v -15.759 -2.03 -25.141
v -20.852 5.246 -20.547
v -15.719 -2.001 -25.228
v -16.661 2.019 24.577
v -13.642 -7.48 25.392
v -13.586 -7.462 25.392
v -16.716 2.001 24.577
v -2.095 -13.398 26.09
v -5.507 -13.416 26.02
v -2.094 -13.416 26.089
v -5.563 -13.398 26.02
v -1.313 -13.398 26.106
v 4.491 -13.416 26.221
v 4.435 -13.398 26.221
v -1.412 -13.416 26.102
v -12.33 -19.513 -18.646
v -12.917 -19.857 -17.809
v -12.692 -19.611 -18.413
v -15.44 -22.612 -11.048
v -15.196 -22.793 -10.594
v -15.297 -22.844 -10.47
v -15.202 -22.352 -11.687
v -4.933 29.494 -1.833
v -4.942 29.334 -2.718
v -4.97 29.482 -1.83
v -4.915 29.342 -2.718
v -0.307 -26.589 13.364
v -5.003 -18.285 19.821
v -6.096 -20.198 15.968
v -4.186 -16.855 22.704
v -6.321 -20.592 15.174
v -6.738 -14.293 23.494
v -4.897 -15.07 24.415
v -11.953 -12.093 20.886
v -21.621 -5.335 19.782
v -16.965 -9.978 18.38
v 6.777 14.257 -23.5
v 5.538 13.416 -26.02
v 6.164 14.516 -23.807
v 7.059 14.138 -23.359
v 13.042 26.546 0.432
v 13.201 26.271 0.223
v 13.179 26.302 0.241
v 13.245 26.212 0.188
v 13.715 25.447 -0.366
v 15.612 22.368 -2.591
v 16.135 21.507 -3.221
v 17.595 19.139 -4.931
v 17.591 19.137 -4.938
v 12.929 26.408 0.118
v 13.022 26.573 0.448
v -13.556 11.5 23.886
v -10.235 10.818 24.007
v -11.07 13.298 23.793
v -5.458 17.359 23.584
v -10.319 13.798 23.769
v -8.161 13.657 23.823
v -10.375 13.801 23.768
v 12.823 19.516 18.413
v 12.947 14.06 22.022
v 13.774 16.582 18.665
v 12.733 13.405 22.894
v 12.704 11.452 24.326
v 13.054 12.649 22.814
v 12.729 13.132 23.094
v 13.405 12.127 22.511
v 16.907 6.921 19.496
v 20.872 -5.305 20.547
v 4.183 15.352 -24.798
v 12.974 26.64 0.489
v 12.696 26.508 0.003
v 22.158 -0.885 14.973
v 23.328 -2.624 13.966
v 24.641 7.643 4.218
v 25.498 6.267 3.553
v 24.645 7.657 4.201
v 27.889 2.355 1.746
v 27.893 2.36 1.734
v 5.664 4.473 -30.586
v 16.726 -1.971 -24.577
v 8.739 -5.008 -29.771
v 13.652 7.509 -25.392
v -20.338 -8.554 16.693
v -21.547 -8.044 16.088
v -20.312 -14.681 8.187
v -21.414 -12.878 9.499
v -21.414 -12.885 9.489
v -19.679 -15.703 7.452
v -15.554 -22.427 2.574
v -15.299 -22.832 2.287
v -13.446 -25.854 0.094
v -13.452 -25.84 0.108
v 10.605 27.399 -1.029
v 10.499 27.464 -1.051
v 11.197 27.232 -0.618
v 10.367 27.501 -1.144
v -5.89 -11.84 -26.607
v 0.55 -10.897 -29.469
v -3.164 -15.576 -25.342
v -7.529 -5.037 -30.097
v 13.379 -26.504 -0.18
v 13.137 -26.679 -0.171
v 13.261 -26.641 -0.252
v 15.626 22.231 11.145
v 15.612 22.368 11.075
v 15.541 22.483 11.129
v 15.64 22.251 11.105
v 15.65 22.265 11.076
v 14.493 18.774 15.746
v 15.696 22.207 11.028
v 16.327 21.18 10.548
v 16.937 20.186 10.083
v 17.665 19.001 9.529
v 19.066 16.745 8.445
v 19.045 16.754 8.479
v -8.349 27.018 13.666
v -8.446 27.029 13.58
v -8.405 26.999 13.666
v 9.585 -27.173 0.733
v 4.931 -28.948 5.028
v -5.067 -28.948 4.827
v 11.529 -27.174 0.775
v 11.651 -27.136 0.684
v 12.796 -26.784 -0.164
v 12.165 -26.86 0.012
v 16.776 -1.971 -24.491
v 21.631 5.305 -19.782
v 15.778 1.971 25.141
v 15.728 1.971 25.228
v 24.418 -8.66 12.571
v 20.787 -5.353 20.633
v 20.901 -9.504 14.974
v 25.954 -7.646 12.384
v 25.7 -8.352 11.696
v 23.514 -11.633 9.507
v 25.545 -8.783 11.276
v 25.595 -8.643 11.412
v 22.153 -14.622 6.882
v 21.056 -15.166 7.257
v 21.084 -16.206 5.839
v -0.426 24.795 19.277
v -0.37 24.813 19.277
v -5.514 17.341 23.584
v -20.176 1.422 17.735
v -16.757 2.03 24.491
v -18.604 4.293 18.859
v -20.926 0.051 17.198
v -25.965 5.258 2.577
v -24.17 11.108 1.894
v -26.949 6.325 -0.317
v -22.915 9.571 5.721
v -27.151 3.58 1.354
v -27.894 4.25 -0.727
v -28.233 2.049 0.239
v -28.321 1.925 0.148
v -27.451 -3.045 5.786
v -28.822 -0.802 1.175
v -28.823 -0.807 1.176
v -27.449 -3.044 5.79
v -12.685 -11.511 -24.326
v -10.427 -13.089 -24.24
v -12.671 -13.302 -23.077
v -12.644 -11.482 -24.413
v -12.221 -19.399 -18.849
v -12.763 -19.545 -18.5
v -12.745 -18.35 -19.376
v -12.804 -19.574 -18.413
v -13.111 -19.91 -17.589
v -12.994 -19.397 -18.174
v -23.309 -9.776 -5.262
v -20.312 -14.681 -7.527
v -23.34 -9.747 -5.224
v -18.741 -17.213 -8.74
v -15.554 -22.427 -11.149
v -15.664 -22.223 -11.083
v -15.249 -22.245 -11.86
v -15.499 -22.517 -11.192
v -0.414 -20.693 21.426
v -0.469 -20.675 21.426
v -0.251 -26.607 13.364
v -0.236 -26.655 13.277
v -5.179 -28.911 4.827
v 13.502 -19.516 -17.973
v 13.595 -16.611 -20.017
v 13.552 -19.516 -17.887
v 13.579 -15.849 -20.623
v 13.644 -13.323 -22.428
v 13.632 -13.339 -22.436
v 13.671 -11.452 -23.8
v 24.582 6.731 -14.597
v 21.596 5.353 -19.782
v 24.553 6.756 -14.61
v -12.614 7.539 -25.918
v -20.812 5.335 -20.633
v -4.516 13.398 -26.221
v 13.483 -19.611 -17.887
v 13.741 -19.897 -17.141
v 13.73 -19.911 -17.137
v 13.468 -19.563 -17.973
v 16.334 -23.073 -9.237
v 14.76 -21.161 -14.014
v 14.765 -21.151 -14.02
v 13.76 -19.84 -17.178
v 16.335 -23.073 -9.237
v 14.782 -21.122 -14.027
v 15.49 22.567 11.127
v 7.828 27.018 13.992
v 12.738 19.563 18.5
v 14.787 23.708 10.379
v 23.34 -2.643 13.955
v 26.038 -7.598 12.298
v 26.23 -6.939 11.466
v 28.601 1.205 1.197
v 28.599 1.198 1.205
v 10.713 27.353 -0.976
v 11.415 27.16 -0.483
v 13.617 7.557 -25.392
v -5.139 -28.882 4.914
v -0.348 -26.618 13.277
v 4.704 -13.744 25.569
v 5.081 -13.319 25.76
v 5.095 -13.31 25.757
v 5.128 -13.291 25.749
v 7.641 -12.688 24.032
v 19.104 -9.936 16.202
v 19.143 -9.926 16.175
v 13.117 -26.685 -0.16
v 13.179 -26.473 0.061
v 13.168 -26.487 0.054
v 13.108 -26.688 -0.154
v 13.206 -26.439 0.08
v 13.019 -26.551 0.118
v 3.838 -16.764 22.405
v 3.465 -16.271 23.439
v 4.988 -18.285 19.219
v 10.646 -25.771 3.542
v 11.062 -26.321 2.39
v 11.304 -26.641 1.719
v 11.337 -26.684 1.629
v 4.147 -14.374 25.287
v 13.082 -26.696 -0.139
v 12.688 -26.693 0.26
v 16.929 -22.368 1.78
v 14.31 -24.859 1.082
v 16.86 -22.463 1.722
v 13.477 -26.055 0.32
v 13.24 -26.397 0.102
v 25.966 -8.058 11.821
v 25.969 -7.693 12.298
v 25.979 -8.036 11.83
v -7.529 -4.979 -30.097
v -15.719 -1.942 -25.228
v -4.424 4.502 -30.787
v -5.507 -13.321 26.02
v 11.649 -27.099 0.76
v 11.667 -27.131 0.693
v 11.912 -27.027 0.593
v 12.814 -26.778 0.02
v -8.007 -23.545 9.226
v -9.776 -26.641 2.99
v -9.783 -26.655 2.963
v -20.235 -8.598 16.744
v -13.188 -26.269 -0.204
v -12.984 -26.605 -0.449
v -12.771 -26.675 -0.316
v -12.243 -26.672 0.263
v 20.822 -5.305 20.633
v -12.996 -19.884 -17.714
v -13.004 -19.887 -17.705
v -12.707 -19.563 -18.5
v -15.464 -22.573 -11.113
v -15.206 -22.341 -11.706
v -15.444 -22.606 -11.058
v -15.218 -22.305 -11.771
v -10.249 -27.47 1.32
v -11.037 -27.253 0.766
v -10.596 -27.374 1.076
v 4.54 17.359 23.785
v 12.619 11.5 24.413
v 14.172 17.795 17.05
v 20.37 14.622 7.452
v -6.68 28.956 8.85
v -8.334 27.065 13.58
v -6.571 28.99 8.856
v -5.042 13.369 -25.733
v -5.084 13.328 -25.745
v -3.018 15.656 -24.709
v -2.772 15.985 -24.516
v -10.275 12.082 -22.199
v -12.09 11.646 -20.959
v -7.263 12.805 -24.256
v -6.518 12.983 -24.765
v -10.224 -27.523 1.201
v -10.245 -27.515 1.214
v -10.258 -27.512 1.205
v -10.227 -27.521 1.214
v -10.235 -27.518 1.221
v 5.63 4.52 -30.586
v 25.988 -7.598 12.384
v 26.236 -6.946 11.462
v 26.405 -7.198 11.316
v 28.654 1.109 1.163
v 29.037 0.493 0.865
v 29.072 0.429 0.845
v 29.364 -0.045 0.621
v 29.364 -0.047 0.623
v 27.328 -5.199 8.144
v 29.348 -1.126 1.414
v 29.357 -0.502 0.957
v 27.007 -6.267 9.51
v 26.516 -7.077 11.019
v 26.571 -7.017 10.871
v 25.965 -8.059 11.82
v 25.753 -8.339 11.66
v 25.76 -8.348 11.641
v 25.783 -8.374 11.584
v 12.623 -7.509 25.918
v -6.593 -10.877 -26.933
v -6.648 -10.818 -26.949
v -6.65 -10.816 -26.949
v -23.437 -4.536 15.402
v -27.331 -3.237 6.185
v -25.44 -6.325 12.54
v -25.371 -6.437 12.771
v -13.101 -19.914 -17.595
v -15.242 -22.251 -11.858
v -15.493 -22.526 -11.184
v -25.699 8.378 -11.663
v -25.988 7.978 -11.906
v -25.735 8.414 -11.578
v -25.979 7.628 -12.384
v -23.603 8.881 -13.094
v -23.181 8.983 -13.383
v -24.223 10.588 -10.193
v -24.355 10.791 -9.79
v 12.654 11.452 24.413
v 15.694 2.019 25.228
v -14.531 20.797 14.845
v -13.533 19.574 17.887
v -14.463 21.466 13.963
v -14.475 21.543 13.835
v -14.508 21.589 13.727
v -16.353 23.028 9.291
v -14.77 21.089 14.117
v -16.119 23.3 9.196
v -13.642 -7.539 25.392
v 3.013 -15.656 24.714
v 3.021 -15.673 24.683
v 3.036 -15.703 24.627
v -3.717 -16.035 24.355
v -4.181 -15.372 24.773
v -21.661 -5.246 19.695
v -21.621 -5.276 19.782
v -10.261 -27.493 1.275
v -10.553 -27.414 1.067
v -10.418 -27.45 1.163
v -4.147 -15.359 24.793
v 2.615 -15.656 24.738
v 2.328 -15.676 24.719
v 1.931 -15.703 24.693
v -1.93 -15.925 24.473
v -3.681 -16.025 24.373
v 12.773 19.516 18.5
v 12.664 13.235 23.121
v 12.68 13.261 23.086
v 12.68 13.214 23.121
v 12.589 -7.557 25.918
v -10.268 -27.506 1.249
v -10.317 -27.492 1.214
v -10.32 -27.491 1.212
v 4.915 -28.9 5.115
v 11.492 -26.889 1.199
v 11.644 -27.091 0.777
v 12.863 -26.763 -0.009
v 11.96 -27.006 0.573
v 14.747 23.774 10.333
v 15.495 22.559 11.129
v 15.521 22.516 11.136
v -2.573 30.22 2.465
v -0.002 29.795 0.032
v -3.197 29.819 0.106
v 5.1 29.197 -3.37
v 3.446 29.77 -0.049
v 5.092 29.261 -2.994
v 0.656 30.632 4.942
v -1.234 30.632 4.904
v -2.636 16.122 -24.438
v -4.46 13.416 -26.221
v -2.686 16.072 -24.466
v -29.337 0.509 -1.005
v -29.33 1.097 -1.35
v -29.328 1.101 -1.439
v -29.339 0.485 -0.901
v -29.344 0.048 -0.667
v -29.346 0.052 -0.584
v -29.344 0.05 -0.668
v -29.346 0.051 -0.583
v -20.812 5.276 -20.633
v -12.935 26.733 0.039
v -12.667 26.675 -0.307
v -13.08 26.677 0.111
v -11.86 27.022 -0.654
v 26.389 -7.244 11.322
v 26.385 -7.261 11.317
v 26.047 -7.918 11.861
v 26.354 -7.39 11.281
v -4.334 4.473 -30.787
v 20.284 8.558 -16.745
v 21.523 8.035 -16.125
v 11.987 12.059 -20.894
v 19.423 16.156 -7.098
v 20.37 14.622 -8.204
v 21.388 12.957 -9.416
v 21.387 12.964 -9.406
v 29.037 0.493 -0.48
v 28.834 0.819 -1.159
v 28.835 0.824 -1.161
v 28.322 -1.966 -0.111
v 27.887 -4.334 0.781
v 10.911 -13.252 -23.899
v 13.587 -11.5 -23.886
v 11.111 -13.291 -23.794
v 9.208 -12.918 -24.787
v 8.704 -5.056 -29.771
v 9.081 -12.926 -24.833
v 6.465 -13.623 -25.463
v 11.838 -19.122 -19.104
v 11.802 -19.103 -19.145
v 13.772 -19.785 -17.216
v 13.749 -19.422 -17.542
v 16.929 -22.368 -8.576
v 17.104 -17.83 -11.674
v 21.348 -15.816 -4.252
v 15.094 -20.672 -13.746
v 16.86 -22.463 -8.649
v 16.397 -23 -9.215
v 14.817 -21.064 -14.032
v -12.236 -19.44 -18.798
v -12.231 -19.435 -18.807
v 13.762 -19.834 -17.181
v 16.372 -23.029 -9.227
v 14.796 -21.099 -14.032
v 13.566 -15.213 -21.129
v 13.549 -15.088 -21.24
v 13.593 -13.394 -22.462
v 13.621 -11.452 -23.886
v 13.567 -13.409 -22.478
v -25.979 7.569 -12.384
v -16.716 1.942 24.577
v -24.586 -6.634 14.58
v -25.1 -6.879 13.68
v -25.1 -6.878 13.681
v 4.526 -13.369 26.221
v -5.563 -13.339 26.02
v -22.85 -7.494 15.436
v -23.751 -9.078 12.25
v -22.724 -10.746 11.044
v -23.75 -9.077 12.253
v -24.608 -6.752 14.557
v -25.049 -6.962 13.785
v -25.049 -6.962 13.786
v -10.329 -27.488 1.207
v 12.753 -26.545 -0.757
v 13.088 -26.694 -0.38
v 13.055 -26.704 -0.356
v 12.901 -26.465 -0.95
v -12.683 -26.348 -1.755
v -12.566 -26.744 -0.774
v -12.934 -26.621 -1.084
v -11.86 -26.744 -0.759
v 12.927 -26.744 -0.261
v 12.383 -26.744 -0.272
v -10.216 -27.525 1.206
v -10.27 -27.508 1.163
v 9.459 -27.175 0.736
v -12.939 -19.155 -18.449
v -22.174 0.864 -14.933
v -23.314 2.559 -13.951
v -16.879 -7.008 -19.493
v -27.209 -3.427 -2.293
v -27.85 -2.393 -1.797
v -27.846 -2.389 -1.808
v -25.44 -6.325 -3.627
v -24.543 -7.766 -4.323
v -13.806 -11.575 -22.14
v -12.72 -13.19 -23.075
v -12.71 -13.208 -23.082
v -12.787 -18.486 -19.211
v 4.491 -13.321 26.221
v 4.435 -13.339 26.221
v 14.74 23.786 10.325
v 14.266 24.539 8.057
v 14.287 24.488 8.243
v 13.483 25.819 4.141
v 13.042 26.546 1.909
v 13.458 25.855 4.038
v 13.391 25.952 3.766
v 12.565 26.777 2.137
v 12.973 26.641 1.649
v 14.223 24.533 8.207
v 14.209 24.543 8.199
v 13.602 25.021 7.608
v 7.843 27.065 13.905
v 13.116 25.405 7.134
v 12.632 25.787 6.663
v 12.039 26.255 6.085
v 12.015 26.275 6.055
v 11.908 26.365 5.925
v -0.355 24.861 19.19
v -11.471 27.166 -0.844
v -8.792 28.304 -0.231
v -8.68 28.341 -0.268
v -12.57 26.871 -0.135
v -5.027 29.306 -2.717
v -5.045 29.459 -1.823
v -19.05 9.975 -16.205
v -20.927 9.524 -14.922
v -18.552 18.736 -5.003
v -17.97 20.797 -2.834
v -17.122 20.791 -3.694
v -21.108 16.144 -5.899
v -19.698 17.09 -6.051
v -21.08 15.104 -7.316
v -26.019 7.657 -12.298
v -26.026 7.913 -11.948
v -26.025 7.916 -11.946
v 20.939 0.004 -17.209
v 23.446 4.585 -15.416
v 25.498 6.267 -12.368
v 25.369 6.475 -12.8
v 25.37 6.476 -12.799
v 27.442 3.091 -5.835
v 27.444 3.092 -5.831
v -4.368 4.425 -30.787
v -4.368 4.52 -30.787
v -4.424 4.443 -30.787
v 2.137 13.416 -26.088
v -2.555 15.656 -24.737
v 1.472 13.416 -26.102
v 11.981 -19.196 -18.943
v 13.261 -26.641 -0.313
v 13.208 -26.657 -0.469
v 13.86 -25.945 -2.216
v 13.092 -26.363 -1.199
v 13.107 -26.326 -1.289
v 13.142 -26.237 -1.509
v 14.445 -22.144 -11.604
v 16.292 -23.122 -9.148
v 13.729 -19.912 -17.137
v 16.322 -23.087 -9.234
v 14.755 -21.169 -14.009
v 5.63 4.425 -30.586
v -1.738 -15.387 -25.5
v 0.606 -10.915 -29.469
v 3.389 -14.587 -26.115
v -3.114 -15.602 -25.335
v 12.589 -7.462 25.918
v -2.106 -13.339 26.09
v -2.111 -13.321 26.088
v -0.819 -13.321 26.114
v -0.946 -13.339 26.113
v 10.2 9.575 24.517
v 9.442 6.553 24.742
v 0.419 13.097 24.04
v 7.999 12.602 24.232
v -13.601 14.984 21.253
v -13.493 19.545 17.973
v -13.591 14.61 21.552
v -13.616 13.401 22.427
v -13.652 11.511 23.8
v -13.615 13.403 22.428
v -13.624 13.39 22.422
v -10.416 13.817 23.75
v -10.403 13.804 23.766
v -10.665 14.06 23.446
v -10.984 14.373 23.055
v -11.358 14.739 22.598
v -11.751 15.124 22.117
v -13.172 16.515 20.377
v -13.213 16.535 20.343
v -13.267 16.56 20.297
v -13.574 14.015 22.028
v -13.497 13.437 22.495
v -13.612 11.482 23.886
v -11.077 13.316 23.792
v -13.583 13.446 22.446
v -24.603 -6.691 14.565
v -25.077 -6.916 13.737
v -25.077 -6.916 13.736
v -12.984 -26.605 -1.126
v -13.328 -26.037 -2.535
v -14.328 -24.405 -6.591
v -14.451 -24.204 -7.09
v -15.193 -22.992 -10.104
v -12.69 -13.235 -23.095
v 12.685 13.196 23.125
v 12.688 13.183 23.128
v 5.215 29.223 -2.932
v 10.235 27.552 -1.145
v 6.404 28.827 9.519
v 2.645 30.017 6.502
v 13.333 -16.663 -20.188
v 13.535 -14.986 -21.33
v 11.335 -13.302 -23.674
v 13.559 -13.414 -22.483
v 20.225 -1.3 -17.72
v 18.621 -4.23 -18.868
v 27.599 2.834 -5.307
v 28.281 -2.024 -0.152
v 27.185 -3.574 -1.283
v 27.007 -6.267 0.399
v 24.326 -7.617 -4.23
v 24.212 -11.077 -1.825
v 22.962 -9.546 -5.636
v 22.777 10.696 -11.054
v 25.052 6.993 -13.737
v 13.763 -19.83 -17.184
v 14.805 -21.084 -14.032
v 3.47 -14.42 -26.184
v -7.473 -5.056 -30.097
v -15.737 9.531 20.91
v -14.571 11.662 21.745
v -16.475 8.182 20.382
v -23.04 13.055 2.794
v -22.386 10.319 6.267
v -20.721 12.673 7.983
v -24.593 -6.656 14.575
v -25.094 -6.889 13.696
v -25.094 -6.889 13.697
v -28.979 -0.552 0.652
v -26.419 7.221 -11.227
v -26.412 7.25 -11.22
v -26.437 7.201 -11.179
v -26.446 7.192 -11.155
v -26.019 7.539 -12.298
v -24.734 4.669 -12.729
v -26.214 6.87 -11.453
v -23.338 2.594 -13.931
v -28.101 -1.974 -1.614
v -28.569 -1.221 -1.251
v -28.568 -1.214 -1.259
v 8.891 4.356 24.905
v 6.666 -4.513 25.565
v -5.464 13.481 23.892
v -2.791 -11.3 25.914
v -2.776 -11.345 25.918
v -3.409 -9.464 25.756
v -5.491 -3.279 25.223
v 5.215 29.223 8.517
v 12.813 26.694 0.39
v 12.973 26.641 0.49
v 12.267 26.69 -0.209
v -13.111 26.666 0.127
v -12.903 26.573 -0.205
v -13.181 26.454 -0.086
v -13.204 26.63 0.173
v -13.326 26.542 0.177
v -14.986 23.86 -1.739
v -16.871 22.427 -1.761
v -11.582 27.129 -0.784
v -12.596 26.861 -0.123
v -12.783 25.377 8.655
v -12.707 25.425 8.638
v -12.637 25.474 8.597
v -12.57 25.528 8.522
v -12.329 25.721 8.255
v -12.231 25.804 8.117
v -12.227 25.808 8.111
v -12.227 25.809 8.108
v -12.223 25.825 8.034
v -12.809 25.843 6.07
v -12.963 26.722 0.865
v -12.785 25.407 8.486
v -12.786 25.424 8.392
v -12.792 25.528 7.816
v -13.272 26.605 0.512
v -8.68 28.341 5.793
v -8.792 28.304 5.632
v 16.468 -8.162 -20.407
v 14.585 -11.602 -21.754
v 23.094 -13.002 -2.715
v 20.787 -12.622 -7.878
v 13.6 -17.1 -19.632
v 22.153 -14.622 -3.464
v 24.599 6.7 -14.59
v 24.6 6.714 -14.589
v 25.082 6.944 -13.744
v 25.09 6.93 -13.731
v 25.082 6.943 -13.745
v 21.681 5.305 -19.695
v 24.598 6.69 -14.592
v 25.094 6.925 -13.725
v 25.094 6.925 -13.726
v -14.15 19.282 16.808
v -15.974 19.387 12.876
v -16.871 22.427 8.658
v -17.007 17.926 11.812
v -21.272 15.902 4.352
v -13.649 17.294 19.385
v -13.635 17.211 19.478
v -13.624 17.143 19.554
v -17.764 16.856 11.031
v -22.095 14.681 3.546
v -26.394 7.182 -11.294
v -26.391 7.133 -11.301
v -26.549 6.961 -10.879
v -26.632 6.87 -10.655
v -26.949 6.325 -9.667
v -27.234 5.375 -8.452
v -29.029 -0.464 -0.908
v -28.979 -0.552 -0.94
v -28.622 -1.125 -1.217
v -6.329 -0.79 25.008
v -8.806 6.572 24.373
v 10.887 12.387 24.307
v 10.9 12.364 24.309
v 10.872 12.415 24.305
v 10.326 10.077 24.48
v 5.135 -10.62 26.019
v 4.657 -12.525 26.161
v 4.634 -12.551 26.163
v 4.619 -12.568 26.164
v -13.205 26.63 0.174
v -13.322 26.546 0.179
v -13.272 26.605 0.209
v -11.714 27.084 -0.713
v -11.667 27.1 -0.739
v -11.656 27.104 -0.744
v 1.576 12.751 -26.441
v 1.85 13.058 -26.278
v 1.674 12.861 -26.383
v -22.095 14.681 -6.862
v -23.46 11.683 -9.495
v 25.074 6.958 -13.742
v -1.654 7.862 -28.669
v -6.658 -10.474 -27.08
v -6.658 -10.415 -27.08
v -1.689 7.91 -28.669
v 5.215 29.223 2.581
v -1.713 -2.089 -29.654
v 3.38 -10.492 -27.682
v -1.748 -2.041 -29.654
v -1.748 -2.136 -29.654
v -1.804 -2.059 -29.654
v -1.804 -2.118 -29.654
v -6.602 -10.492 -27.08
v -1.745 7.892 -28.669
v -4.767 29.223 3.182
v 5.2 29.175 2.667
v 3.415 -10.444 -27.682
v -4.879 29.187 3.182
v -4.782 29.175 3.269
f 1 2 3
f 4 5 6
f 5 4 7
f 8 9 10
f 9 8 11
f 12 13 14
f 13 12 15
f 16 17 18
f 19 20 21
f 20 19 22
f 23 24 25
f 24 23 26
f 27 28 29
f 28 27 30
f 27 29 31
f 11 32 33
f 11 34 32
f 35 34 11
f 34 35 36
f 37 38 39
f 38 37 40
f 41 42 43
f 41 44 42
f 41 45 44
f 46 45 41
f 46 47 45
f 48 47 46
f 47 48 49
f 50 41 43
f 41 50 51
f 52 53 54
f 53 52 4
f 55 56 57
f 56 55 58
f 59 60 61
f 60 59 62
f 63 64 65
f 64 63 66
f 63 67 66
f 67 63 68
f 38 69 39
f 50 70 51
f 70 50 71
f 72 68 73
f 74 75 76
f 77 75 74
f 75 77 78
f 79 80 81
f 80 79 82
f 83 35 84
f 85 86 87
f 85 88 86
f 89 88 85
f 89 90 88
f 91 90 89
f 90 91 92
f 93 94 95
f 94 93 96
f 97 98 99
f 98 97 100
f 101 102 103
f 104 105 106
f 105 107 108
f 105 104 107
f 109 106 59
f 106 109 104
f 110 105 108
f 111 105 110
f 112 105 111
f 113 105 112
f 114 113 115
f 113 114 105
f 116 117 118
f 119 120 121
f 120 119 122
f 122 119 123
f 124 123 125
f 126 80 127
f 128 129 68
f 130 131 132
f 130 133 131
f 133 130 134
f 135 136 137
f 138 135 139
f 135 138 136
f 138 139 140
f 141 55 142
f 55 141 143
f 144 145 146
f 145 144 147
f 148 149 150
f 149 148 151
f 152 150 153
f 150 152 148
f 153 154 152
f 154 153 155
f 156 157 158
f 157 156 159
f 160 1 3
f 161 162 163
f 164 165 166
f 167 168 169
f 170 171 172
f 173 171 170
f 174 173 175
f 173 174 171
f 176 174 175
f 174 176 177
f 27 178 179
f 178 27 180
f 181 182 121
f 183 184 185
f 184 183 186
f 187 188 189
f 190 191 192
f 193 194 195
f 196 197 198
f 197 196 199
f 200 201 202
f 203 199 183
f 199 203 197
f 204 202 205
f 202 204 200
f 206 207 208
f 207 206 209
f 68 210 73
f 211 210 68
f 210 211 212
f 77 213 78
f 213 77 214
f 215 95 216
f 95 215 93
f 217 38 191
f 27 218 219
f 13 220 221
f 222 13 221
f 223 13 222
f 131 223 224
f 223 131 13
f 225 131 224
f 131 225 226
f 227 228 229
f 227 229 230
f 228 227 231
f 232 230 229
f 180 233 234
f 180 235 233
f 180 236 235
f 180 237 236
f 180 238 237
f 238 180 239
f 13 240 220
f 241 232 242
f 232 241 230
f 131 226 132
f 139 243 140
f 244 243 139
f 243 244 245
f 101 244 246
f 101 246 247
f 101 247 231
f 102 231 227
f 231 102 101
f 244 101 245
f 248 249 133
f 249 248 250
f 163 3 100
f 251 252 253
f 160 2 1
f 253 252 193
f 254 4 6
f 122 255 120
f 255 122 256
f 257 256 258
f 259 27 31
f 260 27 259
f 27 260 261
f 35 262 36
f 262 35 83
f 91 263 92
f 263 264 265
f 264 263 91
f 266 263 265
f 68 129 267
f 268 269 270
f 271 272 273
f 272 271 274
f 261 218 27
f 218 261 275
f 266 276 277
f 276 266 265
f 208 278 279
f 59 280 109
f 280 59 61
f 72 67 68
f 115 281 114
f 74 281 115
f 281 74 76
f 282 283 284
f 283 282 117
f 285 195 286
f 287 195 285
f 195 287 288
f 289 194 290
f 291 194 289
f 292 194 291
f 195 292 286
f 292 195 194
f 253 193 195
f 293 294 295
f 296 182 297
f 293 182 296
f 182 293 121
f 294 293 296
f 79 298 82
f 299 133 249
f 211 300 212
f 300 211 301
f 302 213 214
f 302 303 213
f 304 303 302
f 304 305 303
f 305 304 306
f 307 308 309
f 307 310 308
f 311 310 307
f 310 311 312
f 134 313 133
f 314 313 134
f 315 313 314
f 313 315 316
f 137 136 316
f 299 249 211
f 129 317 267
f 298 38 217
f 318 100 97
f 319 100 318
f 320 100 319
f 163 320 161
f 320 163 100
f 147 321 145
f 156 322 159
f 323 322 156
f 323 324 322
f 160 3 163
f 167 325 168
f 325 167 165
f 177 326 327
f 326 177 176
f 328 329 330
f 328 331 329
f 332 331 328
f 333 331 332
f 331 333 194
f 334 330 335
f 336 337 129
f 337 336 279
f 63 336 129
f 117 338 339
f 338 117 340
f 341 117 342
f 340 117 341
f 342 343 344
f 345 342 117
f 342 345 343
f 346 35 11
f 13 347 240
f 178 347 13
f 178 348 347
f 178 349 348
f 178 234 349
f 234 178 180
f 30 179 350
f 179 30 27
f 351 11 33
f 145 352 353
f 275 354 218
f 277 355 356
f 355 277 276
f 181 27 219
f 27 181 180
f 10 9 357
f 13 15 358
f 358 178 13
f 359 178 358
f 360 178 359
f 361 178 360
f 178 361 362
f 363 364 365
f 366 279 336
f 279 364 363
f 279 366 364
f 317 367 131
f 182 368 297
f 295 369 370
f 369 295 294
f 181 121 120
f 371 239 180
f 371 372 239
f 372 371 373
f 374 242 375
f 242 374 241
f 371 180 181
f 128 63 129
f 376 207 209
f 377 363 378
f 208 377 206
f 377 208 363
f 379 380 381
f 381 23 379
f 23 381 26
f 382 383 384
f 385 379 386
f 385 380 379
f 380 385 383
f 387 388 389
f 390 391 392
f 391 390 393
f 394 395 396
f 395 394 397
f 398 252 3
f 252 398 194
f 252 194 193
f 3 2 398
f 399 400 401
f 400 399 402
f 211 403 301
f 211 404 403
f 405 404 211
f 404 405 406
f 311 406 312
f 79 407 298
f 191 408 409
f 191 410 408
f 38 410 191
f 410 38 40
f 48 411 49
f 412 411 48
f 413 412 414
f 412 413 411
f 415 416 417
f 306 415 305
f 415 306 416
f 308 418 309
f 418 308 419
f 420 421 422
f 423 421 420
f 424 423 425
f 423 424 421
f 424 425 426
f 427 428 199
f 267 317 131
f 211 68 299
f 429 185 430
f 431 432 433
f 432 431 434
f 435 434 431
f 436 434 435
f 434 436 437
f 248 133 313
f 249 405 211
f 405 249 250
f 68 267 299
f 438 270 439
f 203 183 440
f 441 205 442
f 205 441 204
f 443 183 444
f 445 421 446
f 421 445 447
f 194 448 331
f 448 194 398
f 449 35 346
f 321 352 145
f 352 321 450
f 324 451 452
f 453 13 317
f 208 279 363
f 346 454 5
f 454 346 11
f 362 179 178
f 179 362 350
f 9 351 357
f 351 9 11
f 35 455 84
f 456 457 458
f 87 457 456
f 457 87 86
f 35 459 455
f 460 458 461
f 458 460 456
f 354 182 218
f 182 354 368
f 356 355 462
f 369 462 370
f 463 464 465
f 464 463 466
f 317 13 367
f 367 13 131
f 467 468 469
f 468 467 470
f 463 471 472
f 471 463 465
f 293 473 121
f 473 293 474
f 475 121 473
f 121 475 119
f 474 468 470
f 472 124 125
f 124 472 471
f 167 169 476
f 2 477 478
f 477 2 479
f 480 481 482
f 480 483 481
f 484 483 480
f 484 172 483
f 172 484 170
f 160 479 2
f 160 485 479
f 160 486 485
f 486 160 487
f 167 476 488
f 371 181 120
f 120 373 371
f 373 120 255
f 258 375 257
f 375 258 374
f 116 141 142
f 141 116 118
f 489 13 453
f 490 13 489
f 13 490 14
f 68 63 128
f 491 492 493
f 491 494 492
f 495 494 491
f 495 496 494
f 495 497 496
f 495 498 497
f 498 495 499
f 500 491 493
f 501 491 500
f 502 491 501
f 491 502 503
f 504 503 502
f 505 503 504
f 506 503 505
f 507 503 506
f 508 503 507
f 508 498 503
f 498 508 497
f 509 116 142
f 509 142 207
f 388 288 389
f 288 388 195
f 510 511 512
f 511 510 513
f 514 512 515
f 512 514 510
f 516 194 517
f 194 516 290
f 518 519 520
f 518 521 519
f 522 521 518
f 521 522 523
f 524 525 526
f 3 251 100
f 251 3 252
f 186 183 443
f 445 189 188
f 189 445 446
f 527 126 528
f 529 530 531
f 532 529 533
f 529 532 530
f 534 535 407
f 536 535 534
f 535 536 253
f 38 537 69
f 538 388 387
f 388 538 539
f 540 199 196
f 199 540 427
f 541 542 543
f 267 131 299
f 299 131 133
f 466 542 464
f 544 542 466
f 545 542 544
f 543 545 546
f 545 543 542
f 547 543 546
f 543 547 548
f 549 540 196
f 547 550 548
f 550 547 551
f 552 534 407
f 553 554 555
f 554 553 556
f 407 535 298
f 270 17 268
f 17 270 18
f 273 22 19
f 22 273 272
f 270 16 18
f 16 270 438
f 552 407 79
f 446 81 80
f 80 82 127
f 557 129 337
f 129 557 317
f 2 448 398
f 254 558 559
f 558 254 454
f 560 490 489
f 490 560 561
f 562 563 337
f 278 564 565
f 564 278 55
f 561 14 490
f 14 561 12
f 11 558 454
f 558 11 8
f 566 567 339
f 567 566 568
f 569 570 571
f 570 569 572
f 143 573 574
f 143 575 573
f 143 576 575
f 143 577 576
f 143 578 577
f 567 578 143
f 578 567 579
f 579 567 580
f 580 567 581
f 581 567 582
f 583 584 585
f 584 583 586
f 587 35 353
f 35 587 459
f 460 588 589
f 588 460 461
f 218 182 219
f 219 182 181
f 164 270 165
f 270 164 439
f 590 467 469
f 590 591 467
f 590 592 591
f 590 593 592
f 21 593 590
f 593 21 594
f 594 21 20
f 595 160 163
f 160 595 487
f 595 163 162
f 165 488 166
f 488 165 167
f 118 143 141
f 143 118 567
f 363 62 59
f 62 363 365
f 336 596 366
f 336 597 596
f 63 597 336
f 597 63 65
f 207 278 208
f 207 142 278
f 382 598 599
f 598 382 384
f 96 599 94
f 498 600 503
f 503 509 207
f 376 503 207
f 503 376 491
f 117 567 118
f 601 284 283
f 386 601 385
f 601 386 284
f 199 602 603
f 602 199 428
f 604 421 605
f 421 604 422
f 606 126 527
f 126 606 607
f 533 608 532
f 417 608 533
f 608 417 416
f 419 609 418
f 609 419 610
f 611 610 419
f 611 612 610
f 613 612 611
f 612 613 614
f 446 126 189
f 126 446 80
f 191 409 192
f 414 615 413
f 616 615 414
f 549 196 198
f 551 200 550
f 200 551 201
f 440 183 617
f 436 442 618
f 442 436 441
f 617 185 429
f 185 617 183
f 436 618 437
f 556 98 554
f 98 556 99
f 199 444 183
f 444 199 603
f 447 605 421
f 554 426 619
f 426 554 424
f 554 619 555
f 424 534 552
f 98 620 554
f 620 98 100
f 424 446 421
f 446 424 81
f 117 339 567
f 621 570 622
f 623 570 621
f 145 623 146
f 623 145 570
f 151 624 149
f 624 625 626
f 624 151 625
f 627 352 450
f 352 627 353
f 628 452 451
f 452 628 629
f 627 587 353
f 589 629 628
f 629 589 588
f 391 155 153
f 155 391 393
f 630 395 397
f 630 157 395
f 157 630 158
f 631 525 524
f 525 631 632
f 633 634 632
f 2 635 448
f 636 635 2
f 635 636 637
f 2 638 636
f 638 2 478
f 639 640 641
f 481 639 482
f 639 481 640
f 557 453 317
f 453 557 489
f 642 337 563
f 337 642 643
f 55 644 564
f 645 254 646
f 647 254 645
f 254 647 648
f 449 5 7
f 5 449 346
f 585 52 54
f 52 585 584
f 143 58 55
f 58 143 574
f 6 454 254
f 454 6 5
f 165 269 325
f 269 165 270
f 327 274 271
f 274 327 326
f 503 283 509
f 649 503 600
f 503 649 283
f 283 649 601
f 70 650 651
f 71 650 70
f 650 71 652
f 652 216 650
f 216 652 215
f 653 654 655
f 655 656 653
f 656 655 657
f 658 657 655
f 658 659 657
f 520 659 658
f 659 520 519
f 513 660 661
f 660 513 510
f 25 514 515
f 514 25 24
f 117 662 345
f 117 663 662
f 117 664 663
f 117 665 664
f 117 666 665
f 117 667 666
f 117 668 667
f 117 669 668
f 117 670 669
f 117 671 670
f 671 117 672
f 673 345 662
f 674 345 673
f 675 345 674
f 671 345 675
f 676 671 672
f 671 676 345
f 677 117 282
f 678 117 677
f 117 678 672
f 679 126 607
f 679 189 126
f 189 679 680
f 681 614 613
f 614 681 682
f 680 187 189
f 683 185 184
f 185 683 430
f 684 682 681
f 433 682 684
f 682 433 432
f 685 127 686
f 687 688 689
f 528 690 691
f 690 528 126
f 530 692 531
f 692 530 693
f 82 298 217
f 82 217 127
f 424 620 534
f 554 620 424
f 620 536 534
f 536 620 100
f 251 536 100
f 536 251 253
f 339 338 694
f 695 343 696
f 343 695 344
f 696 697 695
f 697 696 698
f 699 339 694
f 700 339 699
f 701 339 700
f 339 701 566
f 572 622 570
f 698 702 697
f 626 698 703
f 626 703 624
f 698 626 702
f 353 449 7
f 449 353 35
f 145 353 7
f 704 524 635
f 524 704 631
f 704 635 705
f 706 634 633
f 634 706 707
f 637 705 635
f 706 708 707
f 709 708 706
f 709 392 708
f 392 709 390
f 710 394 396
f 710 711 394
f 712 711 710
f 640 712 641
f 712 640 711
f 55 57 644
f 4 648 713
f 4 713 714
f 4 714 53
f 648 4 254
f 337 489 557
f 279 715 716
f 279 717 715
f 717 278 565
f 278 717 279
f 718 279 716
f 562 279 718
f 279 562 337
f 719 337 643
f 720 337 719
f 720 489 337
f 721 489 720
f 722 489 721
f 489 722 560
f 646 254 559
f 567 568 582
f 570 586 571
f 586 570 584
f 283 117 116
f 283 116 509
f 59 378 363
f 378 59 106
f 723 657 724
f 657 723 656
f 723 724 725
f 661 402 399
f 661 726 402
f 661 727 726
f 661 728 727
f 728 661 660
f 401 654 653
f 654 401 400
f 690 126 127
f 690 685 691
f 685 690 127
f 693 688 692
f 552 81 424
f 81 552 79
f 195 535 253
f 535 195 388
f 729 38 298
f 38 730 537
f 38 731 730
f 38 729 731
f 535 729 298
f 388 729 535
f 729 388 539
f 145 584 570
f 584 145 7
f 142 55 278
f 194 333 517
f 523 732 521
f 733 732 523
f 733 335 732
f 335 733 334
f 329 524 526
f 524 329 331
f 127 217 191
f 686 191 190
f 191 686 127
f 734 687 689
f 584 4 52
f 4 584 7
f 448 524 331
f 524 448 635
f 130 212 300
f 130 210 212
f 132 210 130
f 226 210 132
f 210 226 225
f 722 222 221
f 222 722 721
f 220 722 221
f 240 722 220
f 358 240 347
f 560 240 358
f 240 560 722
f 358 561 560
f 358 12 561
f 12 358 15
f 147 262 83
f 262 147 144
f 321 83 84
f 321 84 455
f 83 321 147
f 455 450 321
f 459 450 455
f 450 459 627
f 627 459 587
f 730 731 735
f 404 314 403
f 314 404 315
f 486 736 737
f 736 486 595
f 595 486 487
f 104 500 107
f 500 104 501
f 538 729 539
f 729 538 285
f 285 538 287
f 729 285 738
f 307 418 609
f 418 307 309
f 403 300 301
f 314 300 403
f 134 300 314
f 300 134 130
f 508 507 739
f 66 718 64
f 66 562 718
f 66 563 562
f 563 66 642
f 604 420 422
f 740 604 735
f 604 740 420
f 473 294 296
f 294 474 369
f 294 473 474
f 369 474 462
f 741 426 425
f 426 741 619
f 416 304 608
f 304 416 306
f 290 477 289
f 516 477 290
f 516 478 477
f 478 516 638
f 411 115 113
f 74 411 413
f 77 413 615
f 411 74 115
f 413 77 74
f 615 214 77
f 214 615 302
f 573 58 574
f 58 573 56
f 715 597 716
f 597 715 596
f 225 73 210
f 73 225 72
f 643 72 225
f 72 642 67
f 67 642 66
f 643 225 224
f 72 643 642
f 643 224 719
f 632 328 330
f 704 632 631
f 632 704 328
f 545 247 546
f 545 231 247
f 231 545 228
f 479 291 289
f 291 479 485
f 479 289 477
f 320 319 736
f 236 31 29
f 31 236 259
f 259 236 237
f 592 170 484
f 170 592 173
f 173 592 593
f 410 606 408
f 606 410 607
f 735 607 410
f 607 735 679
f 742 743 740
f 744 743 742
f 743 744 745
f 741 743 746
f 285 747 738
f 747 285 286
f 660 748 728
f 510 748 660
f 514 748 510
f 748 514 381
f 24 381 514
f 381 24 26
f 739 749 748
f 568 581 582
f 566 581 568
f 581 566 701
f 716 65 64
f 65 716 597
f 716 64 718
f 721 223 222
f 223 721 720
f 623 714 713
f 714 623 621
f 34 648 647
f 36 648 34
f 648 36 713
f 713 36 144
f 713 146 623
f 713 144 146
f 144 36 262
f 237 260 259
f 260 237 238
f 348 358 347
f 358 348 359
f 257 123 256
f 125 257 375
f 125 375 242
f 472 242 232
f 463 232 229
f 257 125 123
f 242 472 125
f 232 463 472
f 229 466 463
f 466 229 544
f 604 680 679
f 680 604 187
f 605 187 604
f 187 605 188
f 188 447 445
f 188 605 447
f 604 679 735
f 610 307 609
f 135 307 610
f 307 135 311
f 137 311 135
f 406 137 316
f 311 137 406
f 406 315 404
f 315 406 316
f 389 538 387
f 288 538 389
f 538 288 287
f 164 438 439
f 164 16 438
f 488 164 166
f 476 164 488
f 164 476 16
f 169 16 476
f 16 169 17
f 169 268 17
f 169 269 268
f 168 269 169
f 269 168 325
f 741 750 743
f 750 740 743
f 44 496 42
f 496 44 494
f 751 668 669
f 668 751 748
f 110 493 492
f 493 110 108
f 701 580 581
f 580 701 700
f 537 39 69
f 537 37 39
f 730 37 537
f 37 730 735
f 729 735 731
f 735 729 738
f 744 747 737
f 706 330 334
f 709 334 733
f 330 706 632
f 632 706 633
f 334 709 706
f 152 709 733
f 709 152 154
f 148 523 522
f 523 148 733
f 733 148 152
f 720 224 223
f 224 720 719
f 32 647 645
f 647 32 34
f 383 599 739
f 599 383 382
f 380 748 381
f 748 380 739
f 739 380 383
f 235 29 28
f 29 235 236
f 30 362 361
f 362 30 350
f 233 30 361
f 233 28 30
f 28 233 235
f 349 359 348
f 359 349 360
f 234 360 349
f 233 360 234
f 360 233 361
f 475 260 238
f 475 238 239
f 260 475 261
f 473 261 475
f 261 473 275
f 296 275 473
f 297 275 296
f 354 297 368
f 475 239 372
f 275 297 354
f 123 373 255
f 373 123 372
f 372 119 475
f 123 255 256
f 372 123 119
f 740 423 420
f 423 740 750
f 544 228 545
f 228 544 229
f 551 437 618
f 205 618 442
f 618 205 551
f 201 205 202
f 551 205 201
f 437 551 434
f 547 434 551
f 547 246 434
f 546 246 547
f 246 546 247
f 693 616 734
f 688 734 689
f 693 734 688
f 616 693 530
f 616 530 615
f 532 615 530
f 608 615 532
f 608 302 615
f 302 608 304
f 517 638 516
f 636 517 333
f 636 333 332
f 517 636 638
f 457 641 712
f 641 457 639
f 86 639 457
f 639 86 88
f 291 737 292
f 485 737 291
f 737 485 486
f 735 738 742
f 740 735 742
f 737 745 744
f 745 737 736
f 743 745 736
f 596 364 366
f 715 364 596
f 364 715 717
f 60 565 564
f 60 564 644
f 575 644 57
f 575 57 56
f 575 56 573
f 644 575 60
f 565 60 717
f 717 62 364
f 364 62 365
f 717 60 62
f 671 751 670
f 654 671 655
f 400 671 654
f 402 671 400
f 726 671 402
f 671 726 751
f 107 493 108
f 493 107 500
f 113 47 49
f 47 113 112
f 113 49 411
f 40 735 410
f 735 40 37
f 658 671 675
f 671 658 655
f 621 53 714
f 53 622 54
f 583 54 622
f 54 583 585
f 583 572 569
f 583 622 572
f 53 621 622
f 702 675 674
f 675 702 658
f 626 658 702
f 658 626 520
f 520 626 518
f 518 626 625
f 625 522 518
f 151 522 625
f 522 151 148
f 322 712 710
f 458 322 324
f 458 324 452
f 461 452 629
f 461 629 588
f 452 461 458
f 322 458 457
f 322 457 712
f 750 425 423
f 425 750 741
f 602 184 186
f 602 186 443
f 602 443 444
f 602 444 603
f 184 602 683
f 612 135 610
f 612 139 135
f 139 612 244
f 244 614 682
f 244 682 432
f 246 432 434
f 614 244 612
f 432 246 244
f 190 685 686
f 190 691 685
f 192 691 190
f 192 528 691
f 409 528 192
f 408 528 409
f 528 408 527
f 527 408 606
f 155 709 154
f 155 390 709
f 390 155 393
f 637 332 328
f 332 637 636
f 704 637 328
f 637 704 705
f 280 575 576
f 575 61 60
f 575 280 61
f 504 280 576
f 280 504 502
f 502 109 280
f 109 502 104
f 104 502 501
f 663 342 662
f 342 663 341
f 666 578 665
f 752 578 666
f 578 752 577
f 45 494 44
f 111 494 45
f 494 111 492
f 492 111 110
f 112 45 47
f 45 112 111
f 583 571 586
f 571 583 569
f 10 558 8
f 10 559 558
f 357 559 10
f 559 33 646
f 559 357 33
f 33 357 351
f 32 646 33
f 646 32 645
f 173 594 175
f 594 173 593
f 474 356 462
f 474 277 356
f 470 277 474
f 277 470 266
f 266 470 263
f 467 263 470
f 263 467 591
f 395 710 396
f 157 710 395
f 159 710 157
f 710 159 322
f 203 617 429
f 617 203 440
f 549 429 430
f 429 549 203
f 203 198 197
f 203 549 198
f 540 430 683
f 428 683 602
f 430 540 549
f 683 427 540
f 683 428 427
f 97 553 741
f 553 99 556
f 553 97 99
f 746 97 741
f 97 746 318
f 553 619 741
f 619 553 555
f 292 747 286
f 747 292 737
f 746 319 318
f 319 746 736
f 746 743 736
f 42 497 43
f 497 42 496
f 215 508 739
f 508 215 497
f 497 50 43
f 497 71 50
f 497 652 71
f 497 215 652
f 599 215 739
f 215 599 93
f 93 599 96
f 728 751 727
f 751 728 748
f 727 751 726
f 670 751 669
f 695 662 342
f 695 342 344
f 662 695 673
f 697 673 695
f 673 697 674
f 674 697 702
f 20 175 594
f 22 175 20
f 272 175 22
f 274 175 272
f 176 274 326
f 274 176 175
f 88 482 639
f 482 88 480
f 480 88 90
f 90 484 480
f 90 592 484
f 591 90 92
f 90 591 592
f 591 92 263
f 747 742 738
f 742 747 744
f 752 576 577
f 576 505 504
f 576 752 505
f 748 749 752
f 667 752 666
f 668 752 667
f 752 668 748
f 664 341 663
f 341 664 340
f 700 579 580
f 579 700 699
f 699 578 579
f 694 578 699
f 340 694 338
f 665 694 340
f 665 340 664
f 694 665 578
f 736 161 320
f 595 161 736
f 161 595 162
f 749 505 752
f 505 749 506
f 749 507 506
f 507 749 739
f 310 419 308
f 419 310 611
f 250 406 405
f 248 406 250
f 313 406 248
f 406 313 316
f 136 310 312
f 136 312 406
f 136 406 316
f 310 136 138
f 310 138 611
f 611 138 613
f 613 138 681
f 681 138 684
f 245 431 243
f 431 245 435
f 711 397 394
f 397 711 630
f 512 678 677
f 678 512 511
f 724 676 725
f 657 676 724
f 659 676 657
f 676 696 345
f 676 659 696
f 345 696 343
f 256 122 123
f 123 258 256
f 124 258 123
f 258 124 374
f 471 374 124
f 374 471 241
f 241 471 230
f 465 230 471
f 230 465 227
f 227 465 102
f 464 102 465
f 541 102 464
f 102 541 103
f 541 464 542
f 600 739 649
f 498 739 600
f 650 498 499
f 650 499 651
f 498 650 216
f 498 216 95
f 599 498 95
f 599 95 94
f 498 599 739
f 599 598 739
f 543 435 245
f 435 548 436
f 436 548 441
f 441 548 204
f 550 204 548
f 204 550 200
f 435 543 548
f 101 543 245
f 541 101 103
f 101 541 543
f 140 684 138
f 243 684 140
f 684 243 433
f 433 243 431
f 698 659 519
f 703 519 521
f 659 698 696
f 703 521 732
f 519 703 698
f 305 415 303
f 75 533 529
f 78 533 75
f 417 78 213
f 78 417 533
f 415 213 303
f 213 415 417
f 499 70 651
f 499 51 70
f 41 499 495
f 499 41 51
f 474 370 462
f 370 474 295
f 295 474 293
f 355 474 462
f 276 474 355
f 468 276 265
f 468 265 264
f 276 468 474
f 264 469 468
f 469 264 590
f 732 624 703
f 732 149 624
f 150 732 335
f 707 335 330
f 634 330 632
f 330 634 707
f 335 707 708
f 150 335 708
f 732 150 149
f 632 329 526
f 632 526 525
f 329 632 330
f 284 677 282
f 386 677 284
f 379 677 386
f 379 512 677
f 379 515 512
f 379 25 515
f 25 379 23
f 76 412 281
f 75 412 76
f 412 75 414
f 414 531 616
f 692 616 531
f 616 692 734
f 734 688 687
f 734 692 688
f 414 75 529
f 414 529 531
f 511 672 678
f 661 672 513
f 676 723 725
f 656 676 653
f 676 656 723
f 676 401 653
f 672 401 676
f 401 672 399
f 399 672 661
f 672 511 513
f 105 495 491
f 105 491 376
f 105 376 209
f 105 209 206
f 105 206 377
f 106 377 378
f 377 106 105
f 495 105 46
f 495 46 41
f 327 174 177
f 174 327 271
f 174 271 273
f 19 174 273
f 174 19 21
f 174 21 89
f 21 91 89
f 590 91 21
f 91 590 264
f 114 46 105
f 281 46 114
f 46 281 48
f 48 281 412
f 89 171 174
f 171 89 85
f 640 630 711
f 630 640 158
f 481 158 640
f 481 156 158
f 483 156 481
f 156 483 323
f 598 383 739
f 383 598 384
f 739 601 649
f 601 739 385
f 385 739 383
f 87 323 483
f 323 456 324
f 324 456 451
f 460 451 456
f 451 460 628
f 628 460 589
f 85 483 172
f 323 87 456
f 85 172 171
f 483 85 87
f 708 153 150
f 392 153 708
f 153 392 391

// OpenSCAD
// Auto-generated OpenSCAD file

    inner_points = 10*[[-0.17041080214674126, 0.7862375594247885, -2.8582778861302787], [0.1802309286658651, 0.2088872902636722, 2.9567222750529307], [-0.17634695174386278, -0.20888728923371336, -2.9567222750529307], [0.17429477906874358, -0.7862375583948297, 2.8582778861302787], [-2.9497504156068732, 0.04931160049722948, -0.3204805387029167], [-2.889853657259625, -0.04931159952382933, 0.6728400755788456], [2.893737634181627, 0.04931160055378816, -0.6728400755788456], [2.9536343925288753, -0.04931159946727065, 0.3204805387029167], [-0.47977606233285736, 2.9127811671079766, 0.3182468427064288], [-0.5145268873613189, -2.9127811660876786, -0.25805664805191697], [0.5184108642833212, 2.912781167117638, 0.25805664805191697], [0.48366003925485973, -2.9127811660780174, -0.3182468427064288], [-0.6461927033123381, 1.5608342286633365, -2.4415866544877143], [-0.3325692049742699, 1.044436449194514, 2.7595076053434417], [-0.6617337447199062, -1.0444364481742165, -2.69931741068893], [-0.3481102463818381, -1.5608342276430391, 2.501776849142226], [0.35199422330384045, 1.560834228672998, -2.501776849142226], [0.6656177216419085, 1.0444364492041753, 2.69931741068893], [0.33645318189627227, -1.0444364481645552, -2.7595076053434417], [0.6500766802343404, -1.5608342276333778, 2.4415866544877143], [-2.6867831123319075, 0.6266618696861422, -1.0934713951014787], [-2.5299713631628737, 0.3684629799517309, 1.5070757348140993], [-2.692719261929029, -0.3684629789723597, -1.1919157840241308], [-2.5359075127599953, -0.6266618687067711, 1.4086313458914472], [2.5397914896819973, 0.6266618697367299, -1.4086313458914472], [2.696603238851031, 0.3684629800023185, 1.1919157840241308], [2.533855340084876, -0.3684629789217721, -1.5070757348140993], [2.6906670892539095, -0.6266618686561835, 1.0934713951014787], [-1.3191089998085306, 2.654582277350415, -0.16013956324217252], [-1.2592122414612827, 2.5559590773293563, 0.8331810510395898], [-1.3501910826236672, -2.555959076324691, -0.6756010756446058], [-1.2902943242764193, -2.6545822763457494, 0.31771953863715663], [1.2941783011984218, 2.6545822773757086, -0.31771953863715663], [1.3540750595456696, 2.5559590773546503, 0.6756010756446058], [1.2630962183832852, -2.555959076299397, -0.8331810510395898], [1.322992976730533, -2.654582276320456, 0.16013956324217252], [-1.4219601402274384, 1.8190331184052655, -1.8658104677986405], [-1.1682334002366181, 1.4012585389575019, 2.341963177750754], [-1.4411699238483318, -1.4012585379528368, -2.1843832023557694], [-1.1874431838575115, -1.8190331174006005, 2.0233904431936245], [1.191327160779514, 1.8190331184305593, -2.0233904431936245], [1.4450539007703342, 1.4012585389827956, 2.1843832023557694], [1.1721173771586206, -1.401258537927543, -2.341963177750754], [1.425844117149441, -1.8190331173753067, 1.8658104677986405], [-2.201396319355864, 1.4622110286266452, -1.350876259465479], [-2.0075663377122916, 1.1430596491999403, 1.8635767718021523], [-2.216937360763432, -1.1430596482109077, -1.6086070156666958], [-2.02310737911986, -1.4622110276376128, 1.6058460156009355], [2.026991356041862, 1.4622110286675716, -1.6058460156009355], [2.220821337685434, 1.1430596492408664, 1.6086070156666958], [2.0114503146342937, -1.1430596481699815, -1.8635767718021523], [2.205280296277866, -1.4622110275966864, 1.350876259465479], [-1.6789912939052822, 2.236807697874855, -0.9943752224774262], [-1.5221795447362483, 1.9786088081404438, 1.606171907438152], [-1.704137227123297, -1.9786088071417498, -1.411392345957207], [-1.5473254779542631, -2.2368076968761605, 1.189154783958371], [1.5512094548762656, 2.2368076979061198, -1.189154783958371], [1.7080212040452996, 1.9786088081717086, 1.411392345957207], [1.5260635216582508, -1.978608807110485, -1.606171907438152], [1.6828752708272847, -2.2368076968448958, 0.9943752224774262], [-0.8711277587214085, 2.8245698953316367, -1.0378735875155352], [-0.9032238569451155, -2.5559590763240982, -1.5701514091469855], [0.7439726156693655, 2.8245698953472695, -1.1352633682560076], [0.7118765174456584, -2.555959076308466, -1.667541189887458], [-0.6140966050435644, 2.4067953158620474, -1.9093088328367496], [-0.6402565536701501, -1.9786088071351857, -2.343142265545548], [0.38409032157261397, 2.406795315871709, -1.9694990274912612], [0.35793037294602836, -1.9786088071255243, -2.4033324602000596], [-0.03179482124573489, 3.0827687850891983, -0.5594871815669338], [-0.06755966168276713, -2.9127811660870866, -1.1526069815542968]];

    outer_points = 10*[[0.02669300107192015, 2.6559559407120075, -1.327709675532447], [-0.042901108049307975, -2.064522788314904, 2.1339007964918846], [0.042901108049307975, 2.064522788314904, -2.1339007964918846], [-0.02669300107192015, -2.6559559407120075, 1.327709675532447], [-2.9205155693857976, 0.40317701641016973, -0.35449197483984196], [-2.932403662473765, -0.40317701641016973, 0.2368216872694541], [2.932403662473765, 0.40317701641016973, -0.2368216872694541], [2.9205155693857976, -0.40317701641016973, 0.35449197483984196], [-0.5473409378859402, 1.731154990176565, 2.349712270792537], [-0.4524570269604289, -1.731154990176565, -2.3698127555891437], [0.4524570269604289, 1.731154990176565, 2.3698127555891437], [0.5473409378859402, -1.731154990176565, -2.349712270792537], [-0.4899922381375115, 2.885258312413753, -0.5028116297625187], [-0.5522391016689532, -1.3368662173646406, 2.593346901066097], [-0.4475588631774159, 1.3368662173646406, -2.613447385862704], [-0.5098057267088576, -2.885258312413753, 0.48271114496591183], [0.5098057267088576, 2.885258312413753, -0.48271114496591183], [0.4475588631774159, -1.3368662173646406, 2.613447385862704], [0.5522391016689532, 1.3368662173646406, -2.593346901066097], [0.4899922381375115, -2.885258312413753, 0.5028116297625187], [-2.6100473914566003, 1.3512477086431498, -0.4235678246153023], [-2.641170823222321, -0.7598145562460469, 1.1245114407990056], [-2.5938392844792126, 0.7598145562460469, -1.22975894557474], [-2.6249627162449336, -1.3512477086431498, 0.318320319839568], [2.6249627162449336, 1.3512477086431498, -0.318320319839568], [2.5938392844792126, -0.7598145562460469, 1.22975894557474], [2.641170823222321, 0.7598145562460469, -1.1245114407990056], [2.6100473914566003, -1.3512477086431498, 0.4235678246153023], [-1.3452418553414955, 1.951569111459282, 1.7886670488516037], [-1.3571299484294628, 1.1452150786389423, 2.3799807109609], [-1.2603751054213042, -1.1452150786389423, -2.4326044633487673], [-1.2722631985092714, -1.951569111459282, -1.8412908012394709], [1.2722631985092714, 1.951569111459282, 1.8412908012394709], [1.2603751054213042, 1.1452150786389423, 2.4326044633487673], [1.3571299484294628, -1.1452150786389423, -2.3799807109609], [1.3452418553414955, -1.951569111459282, -1.7886670488516037], [-1.309798409686354, 2.6648441911310363, 0.025710324587154474], [-1.3601571801298284, -0.7509263058270181, 2.530555193306474], [-1.2573478737209385, 0.7509263058270181, -2.5831789456943413], [-1.307706644164413, -2.6648441911310363, -0.07833407697502164], [1.307706644164413, 2.6648441911310363, 0.07833407697502164], [1.2573478737209385, -0.7509263058270181, 2.5831789456943413], [1.3601571801298284, 0.7509263058270181, -2.530555193306474], [1.309798409686354, -2.6648441911310363, -0.025710324587154474], [-2.119587420229877, 2.0789042795934134, 0.05597876475551708], [-2.158058097585384, -0.5305121845443014, 1.969509971365541], [-2.077154045269781, 0.5305121845443014, -2.0546569913446686], [-2.115624722625288, -2.0789042795934134, -0.14112578473464457], [2.115624722625288, 2.0789042795934134, 0.14112578473464457], [2.077154045269781, -0.5305121845443014, 2.0546569913446686], [2.158058097585384, 0.5305121845443014, -1.969509971365541], [2.119587420229877, -2.0789042795934134, -0.05597876475551708], [-1.6364746945929391, 2.308206651295159, 0.9009772953220524], [-1.6675981263586601, 0.1971443864059621, 2.44905656073636], [-1.5678160516501356, -0.1971443864059621, -2.5141030959188813], [-1.5989394834158566, -2.308206651295159, -0.9660238305045731], [1.5989394834158566, 2.308206651295159, 0.9660238305045731], [1.5678160516501356, 0.1971443864059621, 2.5141030959188813], [1.6675981263586601, -0.1971443864059621, -2.44905656073636], [1.6364746945929391, -2.308206651295159, -0.9009772953220524], [-0.8364820114928158, 2.697002179477167, 1.3579781096013481], [-0.7488465863649101, -0.5008108542945804, -3.0010072869159212], [0.7812250775115821, 2.697002179477167, 1.3905013771926082], [0.8688605026394878, -0.5008108542945804, -2.9684840193246607], [-0.5098057265862307, 3.0536397193130442, 0.48271113886644995], [-0.43837840843571274, 0.4472598379384001, -3.0700831366913817], [0.48999223826013844, 3.0536397193130442, 0.5028116236630568], [0.5614195564106563, 0.4472598379384001, -3.049982651894775], [-0.03858109403726045, 2.4765880581944497, 1.9190233315422813], [0.05907149209596527, -1.0867507658322033, -2.938215579156298]];

    // Convex hull for inner set (I)
    module inner_hull() {
        hull() {
            for (p = inner_points) {
                translate(p) sphere(r=0.1);
            }
        }
    }

    // Convex hull for outer set (O) minus inner hull (O \ I)
    module outer_minus_inner() {
        difference() {
            hull() {
                for (p = outer_points) {
                    translate(p) sphere(r=0.1);
                }
            }
            inner_hull(); // Subtract inner hull
        }
    }

    // Convex hull for outer set (O) minus all translated inner hulls
    module outer_minus_AllTranslationInner() {
        difference() {
            hull() {
                for (p = outer_points) {
                    translate(p) sphere(r=0.1);
                }
            }
            hull() {
                translate([0,0,50]) inner_hull();
                translate([0,0,-50]) inner_hull();
            }; // Subtract translated inner hulls
        }
    }

    // Difference between outer_minus_inner and outer_minus_AllTranslationInner
    module outer_minus_inner_diff() {
        difference() {
            // Outer minus inner
            difference() {
                hull() {
                    for (p = outer_points) {
                        translate(p) sphere(r=0.1);
                    }
                }
                inner_hull();
            }

            // Subtract Outer minus AllTranslationInner
            difference() {
                hull() {
                    for (p = outer_points) {
                        translate(p) sphere(r=0.1);
                    }
                }
                hull() {
                    translate([0,0,50]) inner_hull();
                    translate([0,0,-50]) inner_hull();
                };
            }
        }
    }

    // Rendering all with colors applied
    color([1, 1, 0, 1]) outer_minus_inner_diff(); // Opaque yellow
    
